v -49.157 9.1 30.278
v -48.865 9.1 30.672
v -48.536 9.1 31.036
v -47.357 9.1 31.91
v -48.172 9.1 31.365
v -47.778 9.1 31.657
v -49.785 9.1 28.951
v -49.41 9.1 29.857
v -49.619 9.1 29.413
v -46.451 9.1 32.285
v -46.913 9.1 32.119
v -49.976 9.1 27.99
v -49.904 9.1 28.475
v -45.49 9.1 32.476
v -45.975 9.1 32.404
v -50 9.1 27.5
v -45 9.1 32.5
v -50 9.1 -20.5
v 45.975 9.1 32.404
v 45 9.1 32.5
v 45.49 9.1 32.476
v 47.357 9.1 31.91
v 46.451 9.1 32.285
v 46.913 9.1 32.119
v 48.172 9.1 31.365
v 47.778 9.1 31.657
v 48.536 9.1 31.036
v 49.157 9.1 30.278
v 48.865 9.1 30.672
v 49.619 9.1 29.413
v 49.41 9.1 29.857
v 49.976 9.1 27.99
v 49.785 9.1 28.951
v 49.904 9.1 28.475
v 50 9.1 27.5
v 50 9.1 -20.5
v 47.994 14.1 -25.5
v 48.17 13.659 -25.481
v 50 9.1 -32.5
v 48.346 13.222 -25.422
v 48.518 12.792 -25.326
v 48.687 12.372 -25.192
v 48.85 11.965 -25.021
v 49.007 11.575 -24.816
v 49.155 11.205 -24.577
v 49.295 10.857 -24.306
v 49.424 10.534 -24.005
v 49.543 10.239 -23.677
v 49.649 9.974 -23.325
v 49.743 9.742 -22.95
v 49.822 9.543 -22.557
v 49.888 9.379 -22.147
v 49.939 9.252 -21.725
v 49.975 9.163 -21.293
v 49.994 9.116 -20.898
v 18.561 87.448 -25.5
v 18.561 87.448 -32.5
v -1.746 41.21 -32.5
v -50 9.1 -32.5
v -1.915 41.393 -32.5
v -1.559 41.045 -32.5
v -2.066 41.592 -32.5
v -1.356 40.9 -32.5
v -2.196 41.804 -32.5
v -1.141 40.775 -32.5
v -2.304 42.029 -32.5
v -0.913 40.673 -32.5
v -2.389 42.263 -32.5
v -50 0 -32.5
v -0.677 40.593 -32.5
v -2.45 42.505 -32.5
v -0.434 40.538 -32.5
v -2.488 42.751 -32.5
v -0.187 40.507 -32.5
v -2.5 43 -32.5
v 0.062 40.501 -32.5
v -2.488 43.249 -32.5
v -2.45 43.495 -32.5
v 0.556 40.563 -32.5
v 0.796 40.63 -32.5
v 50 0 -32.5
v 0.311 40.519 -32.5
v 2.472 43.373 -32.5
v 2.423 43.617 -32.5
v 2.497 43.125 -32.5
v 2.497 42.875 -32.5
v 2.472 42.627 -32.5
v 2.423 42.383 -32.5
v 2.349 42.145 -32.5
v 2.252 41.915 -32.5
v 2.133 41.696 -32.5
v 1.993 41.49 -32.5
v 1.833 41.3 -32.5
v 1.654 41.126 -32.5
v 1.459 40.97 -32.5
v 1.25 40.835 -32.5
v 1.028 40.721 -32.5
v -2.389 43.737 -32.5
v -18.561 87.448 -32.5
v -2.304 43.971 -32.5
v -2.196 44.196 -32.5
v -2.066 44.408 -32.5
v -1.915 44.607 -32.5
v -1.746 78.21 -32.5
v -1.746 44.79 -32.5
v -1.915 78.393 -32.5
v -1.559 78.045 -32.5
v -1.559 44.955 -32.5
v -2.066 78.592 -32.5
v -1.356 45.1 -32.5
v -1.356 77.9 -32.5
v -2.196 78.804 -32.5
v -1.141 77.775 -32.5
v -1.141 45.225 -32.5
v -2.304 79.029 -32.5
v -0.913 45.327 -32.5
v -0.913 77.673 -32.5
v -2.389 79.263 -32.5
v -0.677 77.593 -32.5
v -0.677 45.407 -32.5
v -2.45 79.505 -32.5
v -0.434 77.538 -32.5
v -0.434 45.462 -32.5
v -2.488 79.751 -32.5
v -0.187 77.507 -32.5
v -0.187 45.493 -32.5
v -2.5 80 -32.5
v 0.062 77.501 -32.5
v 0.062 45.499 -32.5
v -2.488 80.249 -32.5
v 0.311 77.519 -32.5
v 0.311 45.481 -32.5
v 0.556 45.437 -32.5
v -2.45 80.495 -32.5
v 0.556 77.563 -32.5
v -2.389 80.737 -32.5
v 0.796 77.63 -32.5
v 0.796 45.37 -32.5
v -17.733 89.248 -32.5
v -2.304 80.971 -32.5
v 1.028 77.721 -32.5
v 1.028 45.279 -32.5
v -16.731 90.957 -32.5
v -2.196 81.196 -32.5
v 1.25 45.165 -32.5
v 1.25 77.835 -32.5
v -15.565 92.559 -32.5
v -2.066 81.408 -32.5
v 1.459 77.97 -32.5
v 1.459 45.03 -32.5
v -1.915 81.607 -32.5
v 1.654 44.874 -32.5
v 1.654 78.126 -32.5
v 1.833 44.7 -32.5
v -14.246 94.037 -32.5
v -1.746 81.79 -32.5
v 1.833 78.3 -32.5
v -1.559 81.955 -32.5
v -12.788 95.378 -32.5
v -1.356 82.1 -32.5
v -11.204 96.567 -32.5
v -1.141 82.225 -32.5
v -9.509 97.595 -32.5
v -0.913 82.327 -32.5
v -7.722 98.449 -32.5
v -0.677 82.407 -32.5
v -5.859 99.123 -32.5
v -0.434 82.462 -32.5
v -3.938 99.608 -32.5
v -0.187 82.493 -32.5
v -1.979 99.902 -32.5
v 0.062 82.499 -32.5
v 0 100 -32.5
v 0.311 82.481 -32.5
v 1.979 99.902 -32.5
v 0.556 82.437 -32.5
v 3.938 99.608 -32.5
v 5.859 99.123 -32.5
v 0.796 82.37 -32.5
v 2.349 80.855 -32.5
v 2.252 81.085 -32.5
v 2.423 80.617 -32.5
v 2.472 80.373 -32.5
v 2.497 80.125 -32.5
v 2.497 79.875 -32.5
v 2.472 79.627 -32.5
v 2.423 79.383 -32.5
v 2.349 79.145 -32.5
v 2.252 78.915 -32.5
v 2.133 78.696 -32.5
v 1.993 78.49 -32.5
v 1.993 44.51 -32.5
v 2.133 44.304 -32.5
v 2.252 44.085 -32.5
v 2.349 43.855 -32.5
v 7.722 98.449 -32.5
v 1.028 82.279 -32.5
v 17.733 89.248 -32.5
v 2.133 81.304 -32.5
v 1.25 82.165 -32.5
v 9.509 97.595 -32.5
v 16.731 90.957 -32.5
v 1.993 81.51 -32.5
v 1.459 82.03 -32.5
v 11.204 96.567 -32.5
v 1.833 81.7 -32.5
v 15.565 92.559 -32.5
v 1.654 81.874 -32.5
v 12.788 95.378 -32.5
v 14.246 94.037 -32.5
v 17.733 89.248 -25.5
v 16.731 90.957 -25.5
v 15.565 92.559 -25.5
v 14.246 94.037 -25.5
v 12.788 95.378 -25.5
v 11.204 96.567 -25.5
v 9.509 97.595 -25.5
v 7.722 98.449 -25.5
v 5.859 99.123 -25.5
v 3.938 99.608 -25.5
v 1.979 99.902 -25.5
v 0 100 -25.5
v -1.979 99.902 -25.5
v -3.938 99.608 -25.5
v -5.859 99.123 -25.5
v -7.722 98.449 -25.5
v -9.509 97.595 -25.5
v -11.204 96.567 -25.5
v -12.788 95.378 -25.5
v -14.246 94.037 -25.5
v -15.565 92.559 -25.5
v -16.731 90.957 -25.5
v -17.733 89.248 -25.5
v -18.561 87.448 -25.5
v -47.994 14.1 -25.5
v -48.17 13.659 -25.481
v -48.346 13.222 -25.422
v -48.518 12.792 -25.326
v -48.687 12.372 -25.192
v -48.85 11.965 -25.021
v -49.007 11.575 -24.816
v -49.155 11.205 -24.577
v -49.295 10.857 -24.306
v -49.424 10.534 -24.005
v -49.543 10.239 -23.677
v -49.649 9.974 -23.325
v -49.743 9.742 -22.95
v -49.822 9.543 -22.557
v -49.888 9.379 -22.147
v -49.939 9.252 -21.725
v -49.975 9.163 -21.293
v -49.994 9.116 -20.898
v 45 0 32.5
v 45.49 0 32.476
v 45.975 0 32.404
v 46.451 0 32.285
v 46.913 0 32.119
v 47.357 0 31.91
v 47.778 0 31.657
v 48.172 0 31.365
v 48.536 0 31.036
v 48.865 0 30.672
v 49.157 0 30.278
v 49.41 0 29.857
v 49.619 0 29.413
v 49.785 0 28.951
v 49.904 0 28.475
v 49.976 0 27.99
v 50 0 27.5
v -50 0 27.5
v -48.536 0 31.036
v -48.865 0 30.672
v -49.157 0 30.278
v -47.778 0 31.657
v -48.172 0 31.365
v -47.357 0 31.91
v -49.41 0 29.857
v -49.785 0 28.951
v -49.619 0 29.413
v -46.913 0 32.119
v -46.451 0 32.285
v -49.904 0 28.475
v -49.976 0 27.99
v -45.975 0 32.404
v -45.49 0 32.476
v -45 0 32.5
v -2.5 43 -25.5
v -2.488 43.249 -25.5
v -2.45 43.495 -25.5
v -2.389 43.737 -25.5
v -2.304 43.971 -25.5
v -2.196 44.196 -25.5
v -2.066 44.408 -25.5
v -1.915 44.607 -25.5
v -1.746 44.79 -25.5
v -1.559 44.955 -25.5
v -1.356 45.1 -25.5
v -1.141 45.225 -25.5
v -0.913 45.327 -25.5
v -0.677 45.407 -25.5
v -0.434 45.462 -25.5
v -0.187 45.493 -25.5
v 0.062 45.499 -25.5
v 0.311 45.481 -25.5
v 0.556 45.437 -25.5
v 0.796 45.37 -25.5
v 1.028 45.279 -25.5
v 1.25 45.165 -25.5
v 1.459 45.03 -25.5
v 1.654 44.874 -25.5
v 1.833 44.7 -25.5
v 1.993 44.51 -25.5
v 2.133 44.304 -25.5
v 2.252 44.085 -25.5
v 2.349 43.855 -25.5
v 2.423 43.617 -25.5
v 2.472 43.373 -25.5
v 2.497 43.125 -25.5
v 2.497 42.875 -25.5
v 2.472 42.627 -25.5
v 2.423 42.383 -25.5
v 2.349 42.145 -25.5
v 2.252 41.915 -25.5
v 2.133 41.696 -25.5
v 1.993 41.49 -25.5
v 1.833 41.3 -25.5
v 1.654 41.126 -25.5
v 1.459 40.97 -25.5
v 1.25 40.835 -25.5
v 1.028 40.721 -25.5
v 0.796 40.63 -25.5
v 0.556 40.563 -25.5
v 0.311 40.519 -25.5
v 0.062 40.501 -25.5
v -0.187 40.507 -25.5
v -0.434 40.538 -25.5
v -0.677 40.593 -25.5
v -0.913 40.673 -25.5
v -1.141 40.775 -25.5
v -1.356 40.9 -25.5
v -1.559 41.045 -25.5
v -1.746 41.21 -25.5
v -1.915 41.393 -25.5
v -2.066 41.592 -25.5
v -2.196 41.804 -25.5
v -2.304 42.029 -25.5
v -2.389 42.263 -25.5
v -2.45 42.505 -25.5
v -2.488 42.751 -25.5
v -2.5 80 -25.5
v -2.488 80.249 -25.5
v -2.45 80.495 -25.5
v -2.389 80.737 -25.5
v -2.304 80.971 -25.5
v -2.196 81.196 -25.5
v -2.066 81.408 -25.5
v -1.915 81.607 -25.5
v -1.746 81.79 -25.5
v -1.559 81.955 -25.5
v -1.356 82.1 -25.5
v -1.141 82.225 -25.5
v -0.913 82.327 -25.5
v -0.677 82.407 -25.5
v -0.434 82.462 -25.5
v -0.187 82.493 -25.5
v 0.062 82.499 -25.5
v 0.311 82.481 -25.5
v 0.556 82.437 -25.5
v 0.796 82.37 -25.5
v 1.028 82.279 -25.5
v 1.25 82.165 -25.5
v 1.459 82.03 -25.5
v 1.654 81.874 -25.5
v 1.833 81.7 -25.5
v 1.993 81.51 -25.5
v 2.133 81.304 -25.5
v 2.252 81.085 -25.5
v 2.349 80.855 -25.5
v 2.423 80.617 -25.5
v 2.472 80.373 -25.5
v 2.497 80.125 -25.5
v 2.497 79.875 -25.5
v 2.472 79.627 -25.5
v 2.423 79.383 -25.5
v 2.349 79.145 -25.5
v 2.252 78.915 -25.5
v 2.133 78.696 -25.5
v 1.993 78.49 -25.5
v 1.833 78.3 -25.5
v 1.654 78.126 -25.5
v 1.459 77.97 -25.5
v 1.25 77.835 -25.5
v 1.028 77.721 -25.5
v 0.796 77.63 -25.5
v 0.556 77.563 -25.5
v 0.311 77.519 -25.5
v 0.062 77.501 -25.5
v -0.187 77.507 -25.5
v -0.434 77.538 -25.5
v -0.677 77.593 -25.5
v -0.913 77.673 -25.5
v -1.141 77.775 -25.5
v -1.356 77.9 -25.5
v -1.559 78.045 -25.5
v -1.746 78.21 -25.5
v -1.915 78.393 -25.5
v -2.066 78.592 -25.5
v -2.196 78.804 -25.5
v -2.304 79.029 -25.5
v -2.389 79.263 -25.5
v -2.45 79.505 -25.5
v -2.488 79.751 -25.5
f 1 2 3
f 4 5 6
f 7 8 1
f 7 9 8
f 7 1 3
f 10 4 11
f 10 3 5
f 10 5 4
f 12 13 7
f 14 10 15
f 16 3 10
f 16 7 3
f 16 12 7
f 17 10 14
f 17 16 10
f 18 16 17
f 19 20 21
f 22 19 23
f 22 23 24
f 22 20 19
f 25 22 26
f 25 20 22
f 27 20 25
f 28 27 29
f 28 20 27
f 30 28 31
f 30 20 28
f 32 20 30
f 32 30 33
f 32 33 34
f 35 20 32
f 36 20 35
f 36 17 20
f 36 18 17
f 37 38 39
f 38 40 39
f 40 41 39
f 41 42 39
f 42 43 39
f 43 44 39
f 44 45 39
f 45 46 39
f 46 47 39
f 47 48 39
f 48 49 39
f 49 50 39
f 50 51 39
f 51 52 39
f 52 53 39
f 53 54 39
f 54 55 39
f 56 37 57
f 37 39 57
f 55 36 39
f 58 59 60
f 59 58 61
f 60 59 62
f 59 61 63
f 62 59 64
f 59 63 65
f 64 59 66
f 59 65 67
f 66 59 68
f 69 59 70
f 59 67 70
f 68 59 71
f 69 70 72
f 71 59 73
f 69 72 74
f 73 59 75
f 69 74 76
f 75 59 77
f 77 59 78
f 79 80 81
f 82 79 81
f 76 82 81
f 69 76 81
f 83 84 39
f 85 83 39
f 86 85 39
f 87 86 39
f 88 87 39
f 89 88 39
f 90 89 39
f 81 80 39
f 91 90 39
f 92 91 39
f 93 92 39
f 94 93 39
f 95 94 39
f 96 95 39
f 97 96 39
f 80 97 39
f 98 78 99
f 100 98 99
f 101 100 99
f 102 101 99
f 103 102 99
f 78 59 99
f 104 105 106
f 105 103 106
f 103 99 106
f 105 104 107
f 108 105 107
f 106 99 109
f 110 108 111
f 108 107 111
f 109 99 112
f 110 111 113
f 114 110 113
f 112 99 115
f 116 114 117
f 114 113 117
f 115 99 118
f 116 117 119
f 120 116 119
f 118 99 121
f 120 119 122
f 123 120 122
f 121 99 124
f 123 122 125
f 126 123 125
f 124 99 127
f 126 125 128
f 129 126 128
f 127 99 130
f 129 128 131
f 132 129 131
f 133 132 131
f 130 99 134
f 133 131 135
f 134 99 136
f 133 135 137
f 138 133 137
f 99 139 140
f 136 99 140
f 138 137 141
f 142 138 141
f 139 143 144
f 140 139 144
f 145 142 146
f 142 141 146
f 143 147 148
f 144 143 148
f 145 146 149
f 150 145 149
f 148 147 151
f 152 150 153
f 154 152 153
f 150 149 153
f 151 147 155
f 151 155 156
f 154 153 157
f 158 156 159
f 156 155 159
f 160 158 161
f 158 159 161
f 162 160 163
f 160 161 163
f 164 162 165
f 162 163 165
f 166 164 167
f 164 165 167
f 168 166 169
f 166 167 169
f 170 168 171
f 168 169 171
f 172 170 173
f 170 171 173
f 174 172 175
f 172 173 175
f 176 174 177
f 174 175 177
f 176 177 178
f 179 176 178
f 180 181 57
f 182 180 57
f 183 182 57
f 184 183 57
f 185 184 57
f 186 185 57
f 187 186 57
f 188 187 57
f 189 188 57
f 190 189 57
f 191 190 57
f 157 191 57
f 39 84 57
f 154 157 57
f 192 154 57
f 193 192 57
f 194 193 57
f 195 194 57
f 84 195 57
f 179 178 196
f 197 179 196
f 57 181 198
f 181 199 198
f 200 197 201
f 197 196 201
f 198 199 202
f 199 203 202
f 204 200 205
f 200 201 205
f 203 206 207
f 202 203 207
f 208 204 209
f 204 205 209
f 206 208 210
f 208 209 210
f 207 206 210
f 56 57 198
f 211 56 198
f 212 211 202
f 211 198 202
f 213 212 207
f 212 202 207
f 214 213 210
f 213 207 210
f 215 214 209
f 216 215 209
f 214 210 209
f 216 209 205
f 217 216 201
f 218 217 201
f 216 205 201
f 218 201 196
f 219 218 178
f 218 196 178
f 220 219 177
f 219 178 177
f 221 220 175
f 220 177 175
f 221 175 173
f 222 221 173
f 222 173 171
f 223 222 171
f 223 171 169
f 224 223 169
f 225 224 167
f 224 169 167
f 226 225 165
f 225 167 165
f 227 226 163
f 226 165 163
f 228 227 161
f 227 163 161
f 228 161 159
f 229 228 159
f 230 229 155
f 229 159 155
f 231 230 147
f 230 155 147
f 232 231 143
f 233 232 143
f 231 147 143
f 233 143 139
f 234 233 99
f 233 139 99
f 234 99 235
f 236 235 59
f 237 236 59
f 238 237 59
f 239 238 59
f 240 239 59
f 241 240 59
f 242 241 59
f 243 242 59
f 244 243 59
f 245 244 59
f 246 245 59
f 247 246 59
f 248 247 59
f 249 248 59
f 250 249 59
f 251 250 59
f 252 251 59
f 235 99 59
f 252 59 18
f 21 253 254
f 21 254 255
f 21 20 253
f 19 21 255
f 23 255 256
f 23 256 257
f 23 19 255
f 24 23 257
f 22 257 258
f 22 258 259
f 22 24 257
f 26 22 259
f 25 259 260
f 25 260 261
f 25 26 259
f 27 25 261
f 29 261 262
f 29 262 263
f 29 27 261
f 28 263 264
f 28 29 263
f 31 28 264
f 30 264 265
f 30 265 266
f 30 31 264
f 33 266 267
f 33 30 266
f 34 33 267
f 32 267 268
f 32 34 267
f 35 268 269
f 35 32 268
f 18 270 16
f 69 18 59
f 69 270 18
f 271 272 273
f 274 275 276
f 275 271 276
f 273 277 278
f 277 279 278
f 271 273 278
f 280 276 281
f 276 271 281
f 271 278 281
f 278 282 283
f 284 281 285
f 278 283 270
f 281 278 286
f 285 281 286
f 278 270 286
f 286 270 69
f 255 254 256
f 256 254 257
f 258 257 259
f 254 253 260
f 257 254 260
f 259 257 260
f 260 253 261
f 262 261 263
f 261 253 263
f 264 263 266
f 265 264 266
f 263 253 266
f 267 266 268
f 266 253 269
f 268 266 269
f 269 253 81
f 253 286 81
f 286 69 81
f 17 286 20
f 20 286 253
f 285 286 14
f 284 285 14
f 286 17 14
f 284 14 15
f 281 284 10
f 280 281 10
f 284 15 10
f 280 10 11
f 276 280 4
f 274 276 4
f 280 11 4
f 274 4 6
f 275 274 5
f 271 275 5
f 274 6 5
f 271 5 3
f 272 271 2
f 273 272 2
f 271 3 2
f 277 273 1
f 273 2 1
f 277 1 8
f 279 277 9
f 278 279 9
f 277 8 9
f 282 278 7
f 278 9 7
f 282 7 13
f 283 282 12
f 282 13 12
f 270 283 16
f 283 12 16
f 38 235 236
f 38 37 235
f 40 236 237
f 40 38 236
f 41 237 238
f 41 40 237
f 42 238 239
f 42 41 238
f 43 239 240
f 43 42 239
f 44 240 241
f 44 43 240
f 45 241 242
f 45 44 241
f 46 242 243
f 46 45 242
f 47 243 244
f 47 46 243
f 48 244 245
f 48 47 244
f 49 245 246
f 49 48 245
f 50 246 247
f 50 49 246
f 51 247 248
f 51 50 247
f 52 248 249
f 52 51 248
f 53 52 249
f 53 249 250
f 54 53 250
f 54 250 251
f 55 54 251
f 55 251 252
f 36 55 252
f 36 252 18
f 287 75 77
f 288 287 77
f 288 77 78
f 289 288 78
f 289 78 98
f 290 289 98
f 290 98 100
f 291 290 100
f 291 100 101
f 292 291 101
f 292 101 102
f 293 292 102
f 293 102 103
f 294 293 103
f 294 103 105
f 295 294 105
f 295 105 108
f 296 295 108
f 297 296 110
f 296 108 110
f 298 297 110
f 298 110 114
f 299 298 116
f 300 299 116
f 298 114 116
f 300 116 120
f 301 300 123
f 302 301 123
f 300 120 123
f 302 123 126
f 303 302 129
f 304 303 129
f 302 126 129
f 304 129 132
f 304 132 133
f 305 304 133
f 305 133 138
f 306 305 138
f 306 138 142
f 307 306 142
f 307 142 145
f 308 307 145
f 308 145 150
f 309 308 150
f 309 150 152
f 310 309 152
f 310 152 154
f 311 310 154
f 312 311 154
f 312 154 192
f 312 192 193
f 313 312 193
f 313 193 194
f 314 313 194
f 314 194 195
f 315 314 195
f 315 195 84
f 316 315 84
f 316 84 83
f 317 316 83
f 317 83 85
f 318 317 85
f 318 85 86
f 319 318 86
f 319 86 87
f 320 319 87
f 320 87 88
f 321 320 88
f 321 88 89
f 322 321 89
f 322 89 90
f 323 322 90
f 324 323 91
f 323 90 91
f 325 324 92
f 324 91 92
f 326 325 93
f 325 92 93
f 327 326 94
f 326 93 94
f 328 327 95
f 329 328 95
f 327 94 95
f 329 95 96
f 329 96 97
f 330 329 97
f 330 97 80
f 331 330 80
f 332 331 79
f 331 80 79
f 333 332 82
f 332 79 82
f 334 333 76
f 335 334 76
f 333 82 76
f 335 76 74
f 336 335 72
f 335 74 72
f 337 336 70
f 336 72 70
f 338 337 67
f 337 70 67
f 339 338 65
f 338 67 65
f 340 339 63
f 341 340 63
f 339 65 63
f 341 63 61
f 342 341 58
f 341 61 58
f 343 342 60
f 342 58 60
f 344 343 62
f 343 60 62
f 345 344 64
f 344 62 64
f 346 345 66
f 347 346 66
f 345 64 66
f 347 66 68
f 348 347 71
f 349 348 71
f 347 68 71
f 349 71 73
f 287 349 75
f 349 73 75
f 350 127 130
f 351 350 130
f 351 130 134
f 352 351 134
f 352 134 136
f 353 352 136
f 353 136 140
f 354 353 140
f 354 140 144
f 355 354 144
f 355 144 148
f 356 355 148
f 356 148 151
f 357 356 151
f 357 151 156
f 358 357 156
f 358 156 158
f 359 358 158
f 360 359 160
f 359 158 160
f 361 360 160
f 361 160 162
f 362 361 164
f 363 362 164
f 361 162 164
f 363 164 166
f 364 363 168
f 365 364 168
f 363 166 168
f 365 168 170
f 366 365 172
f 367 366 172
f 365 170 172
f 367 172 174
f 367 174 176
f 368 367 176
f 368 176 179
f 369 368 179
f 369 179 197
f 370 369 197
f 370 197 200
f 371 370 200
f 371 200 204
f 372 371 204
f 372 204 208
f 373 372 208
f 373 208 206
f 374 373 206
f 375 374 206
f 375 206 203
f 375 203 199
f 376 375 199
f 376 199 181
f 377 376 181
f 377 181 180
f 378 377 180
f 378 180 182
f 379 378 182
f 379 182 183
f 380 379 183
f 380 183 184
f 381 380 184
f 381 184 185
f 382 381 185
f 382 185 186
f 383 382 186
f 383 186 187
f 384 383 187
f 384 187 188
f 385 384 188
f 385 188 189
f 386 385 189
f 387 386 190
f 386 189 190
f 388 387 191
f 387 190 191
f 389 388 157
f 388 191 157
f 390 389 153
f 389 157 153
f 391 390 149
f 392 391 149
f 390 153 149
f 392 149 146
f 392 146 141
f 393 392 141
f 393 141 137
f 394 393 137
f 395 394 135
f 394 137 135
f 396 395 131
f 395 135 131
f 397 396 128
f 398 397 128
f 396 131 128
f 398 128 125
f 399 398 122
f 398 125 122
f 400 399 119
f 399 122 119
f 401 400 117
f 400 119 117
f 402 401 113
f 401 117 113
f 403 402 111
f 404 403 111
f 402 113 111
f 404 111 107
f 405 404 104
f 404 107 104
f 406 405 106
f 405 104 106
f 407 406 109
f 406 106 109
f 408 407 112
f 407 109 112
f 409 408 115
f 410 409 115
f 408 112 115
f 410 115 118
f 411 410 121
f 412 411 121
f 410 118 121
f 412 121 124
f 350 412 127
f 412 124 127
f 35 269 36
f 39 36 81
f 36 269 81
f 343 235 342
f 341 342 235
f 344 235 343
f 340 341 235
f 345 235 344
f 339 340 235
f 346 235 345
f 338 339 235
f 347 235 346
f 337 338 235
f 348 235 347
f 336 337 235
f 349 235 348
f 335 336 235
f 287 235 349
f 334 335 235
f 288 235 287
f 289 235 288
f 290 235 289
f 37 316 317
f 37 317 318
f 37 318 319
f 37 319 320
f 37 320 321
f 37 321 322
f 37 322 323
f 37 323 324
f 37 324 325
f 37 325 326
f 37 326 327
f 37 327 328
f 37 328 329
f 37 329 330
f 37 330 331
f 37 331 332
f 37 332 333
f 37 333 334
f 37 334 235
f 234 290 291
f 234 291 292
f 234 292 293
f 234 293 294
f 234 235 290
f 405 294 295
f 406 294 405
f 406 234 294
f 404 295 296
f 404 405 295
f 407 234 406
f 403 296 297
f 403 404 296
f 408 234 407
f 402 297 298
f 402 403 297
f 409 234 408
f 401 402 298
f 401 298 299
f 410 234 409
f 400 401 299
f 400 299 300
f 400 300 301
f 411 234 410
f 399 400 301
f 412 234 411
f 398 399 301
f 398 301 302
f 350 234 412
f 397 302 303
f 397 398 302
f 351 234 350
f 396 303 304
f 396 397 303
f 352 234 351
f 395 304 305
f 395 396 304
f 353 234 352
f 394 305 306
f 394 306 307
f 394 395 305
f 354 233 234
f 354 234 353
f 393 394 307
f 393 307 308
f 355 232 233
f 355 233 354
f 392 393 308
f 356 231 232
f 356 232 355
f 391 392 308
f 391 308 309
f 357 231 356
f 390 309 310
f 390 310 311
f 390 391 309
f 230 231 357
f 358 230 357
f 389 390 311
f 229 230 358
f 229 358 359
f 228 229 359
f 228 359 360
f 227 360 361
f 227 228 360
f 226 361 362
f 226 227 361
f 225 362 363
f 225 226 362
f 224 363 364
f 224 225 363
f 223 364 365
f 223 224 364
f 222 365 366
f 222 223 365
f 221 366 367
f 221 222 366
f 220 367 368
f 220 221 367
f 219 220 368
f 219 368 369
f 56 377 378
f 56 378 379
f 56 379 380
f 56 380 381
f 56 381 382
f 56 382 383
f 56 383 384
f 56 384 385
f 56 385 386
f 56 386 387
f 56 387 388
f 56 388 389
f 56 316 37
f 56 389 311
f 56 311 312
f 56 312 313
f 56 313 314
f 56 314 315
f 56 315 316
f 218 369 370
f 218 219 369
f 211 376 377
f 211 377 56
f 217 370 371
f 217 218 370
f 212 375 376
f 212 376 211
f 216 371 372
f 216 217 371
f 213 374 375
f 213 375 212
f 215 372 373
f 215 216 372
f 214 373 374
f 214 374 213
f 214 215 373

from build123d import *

# Parameters (mm, degrees)
SKETCH1_W                 = 100
SKETCH1_H                 = 65
EXTRUDE1_DEPTH            = 9.1
EXTRUDE2_DEPTH            = 7
M6X1_0_TAPPED_HOLE2_D     = 5
M6X1_0_TAPPED_HOLE2_DEPTH = 15
M6X1_0_TAPPED_HOLE2_TIP   = 1.502151548
FILLET1_R                 = 5
FILLET2_R                 = 5


with BuildPart() as part:
    # Sketch1 → Extrude1 (new body)
    with BuildSketch(Plane(origin=(0, 0, 0), x_dir=(1, 0, 0), z_dir=(0, 1, 0))):
        Rectangle(SKETCH1_W, SKETCH1_H)
    extrude(amount=EXTRUDE1_DEPTH)

    # Sketch3 → Extrude2 (add)
    with BuildSketch(Plane(origin=(0, 0, -32.5), x_dir=(-1, 0, 0), z_dir=(0, 0, -1))):
        with BuildLine():
            Line((-50, 9.1), (-18.561406243, 87.448100313))
            ThreePointArc((-18.561406243, 87.448100313), (0, 100), (18.561406243, 87.448100313))
            Line((18.561406243, 87.448100313), (50, 9.1))
            Line((50, 9.1), (-50, 9.1))
        make_face()
    extrude(amount=-EXTRUDE2_DEPTH)

    # M6x1.0 Tapped Hole2
    with Locations(Plane.XY.offset(-25.5)):
        with Locations((0, 80), (0, 43)):
            Hole(M6X1_0_TAPPED_HOLE2_D / 2, depth=M6X1_0_TAPPED_HOLE2_DEPTH)
            with Locations((0, 0, -(M6X1_0_TAPPED_HOLE2_DEPTH + M6X1_0_TAPPED_HOLE2_TIP / 2))):  # 118° drill point
                Cone(0, M6X1_0_TAPPED_HOLE2_D / 2, M6X1_0_TAPPED_HOLE2_TIP, mode=Mode.SUBTRACT)

    # Fillet1
    fillet1_edges = [part.edges().sort_by_distance(p)[0] for p in [
        (0, 9.1, -25.5),
    ]]
    fillet(fillet1_edges, radius=FILLET1_R)

    # Fillet2
    fillet2_edges = [part.edges().sort_by_distance(p)[0] for p in [
        (-50, 4.55, 32.5),
        (50, 4.55, 32.5),
    ]]
    fillet(fillet2_edges, radius=FILLET2_R)


solid = part.part
